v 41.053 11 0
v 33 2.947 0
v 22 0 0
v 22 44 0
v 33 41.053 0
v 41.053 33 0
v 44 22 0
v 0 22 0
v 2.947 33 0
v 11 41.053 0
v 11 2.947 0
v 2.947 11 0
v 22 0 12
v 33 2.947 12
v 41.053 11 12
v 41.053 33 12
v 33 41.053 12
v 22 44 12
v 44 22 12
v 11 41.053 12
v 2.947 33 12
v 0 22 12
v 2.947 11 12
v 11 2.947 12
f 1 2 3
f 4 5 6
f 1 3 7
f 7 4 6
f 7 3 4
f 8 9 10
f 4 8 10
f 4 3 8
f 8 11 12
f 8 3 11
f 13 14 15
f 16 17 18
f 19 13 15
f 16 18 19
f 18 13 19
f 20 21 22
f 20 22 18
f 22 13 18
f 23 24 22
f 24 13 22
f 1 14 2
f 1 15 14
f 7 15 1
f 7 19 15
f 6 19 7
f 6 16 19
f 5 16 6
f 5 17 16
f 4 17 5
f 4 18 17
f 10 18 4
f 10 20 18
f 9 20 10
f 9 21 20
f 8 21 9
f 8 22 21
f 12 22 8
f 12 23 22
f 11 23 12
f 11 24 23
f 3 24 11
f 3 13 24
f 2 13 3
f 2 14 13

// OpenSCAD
$fn = 32;

// ----------------------------------------------------------------------
// Flat adaptor: keyed, 12 mm thick
// ----------------------------------------------------------------------

// --- parameters (mm) ---
profile_height = 12;      // extrusion height
profile_points = 12;      // points of the closed outline

profile = [[0, 22], [2.947, 11], [11, 2.947], [22, 0], [33, 2.947], [41.053, 11], [44, 22], [41.053, 33], [33, 41.053], [22, 44], [11, 41.053], [2.947, 33]];  // single closed polygon, 12 points, counter clockwise

// --- the one profile operation ---
linear_extrude(height = profile_height) polygon(points = profile);
